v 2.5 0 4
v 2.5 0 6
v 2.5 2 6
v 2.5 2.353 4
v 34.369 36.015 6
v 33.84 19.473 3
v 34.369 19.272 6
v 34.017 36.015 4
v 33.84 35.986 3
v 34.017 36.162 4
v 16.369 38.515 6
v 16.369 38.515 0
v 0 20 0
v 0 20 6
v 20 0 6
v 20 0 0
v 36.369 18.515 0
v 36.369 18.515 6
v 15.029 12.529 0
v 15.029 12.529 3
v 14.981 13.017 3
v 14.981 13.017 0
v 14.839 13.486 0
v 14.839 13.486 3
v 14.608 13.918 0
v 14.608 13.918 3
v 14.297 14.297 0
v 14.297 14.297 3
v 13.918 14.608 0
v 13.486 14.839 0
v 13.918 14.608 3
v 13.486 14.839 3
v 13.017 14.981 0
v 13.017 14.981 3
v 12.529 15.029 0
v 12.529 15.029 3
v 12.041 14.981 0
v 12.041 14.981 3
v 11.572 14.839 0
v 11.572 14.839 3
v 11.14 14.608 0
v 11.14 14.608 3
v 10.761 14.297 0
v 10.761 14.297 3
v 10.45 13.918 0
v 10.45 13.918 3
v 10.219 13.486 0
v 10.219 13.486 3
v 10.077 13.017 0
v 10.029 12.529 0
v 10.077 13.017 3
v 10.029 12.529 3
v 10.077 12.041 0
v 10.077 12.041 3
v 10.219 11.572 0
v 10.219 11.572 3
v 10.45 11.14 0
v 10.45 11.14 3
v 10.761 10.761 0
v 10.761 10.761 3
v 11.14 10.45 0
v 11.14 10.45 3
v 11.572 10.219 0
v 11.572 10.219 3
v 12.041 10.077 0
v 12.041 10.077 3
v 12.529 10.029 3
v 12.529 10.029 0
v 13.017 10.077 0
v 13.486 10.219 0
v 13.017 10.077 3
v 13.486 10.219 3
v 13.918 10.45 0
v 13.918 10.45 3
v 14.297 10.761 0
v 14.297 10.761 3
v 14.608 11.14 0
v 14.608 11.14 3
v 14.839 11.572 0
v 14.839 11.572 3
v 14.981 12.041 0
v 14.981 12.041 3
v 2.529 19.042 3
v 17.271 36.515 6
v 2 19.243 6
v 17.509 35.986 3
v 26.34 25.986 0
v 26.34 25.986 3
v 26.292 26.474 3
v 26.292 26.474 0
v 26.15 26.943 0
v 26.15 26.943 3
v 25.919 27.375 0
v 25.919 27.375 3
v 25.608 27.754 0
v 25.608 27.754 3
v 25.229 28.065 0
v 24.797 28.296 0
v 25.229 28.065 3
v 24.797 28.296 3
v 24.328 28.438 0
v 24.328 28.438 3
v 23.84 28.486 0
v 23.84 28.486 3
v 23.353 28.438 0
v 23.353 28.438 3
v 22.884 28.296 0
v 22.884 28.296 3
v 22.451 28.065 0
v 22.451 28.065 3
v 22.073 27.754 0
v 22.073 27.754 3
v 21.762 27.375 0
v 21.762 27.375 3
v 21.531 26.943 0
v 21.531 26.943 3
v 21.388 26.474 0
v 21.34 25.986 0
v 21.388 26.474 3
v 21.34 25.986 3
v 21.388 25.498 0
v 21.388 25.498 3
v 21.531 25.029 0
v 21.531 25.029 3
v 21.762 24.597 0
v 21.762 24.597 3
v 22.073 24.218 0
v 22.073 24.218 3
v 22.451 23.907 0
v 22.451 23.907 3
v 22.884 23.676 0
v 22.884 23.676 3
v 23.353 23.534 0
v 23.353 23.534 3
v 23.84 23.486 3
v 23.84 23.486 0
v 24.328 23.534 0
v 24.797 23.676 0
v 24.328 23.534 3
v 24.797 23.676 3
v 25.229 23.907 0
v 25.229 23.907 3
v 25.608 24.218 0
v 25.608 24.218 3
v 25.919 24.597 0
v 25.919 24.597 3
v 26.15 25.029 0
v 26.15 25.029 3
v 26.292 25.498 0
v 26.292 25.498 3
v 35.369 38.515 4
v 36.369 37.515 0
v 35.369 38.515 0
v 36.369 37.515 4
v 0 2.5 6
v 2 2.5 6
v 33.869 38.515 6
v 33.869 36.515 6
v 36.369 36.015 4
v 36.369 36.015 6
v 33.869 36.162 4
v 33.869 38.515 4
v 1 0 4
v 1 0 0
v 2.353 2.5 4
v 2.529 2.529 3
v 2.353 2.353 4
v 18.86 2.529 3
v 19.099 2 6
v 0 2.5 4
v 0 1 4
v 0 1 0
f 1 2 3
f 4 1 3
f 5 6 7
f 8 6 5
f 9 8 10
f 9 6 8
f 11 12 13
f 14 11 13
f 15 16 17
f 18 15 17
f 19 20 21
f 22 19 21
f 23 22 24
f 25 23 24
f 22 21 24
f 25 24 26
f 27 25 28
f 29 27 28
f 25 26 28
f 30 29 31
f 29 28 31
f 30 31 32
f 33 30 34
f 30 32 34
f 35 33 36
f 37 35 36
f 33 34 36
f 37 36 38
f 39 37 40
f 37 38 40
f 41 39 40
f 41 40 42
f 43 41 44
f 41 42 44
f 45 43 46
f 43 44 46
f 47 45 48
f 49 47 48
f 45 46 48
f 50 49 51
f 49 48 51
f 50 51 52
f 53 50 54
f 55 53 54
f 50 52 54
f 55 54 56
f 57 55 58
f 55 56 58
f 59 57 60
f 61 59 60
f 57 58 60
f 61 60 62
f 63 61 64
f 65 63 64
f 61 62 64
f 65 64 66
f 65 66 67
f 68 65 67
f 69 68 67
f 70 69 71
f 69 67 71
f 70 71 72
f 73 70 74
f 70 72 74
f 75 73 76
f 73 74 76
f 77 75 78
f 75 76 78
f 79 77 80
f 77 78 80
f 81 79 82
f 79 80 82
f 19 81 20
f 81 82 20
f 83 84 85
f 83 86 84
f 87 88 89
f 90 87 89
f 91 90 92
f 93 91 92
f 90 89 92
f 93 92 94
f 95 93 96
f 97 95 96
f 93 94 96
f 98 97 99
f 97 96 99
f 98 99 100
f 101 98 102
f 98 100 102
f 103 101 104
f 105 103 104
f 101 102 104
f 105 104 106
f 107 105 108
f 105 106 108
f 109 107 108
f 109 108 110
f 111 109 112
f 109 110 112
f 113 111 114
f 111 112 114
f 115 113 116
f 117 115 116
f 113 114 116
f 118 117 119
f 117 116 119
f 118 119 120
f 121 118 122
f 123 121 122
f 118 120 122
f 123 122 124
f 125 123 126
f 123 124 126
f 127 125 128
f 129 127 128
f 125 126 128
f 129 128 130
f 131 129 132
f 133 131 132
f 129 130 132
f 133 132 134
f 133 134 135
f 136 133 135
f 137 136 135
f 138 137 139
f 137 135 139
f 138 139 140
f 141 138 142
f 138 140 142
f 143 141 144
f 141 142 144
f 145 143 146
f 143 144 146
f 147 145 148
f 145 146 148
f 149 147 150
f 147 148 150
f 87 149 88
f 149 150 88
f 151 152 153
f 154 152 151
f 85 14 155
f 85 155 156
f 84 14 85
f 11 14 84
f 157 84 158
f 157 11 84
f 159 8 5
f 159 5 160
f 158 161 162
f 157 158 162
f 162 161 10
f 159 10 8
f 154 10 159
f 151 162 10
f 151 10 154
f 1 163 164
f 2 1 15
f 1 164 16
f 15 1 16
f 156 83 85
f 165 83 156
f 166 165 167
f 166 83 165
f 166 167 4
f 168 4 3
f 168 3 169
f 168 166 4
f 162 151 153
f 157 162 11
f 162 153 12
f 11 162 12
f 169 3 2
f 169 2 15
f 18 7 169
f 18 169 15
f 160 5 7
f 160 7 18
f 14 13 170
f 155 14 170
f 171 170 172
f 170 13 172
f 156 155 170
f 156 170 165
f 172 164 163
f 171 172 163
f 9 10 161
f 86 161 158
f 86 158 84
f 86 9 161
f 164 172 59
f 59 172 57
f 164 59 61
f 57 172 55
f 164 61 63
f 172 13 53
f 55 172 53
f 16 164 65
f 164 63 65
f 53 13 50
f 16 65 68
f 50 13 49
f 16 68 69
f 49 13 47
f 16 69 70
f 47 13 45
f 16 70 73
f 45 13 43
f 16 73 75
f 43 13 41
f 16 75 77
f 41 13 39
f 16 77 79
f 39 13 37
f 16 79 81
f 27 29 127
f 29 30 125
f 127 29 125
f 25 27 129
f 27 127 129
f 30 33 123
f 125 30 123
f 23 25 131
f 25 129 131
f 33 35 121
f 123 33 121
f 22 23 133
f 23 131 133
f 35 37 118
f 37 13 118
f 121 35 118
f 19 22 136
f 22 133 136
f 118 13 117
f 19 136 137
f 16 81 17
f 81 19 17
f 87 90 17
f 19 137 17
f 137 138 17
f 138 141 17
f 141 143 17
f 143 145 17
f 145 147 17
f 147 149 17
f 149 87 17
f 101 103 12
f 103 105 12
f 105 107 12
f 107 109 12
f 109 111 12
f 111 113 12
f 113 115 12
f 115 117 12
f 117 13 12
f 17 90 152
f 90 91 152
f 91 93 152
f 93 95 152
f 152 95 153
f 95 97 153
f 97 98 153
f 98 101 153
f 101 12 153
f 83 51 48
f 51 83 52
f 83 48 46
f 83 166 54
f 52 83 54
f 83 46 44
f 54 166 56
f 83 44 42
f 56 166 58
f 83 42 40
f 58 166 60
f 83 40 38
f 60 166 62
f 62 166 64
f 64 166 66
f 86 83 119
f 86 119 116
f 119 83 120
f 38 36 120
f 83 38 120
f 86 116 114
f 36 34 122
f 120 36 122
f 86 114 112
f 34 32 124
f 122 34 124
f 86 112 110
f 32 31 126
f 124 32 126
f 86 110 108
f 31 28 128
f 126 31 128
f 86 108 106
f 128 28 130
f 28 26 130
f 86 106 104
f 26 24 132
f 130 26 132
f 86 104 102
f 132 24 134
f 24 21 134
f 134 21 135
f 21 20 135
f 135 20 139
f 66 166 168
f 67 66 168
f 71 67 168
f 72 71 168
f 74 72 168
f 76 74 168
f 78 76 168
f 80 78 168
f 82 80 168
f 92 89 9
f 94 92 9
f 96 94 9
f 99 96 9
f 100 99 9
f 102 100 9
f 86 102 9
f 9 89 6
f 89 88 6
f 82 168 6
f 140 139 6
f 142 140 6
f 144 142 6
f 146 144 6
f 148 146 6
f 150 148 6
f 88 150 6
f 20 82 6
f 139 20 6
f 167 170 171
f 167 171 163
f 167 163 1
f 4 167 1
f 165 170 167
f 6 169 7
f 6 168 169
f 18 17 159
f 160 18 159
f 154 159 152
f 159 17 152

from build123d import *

# Parameters (mm, degrees)
F1_DEPTH = 6
F3_DEPTH = 3
F3_TAPER = 10
F4_SIZE  = 1
F5_W     = 2.5
F5_H     = 2.5
F6_DEPTH = 2
F7_R     = 2.5
F8_DEPTH = 3


with BuildPart() as f1:
    # F0 (on Top) → F1 (new body)
    with BuildSketch(Plane.XY):
        Polygon((0, 20), (0, 0), (20, 0), (36.3692647093, 18.5151209051), (36.3692647093, 38.5151209051), (16.3692647093, 38.5151209051), align=None)
    extrude(amount=F1_DEPTH)

    # F2 (on face) → F3 (cut)
    with BuildSketch(Plane.XY.offset(6)):
        Polygon((2, 19.2426673516), (2, 2), (19.0986453142, 2), (34.3692647093, 19.2724535535), (34.3692647093, 36.5151209051), (17.2706193952, 36.5151209051), align=None)
    extrude(amount=-F3_DEPTH, taper=F3_TAPER, mode=Mode.SUBTRACT)

    # F4
    f4_edges = [f1.edges().sort_by_distance(p)[0] for p in [
        (0, 0, 3),
        (36.369265, 38.515121, 3),
    ]]
    chamfer(f4_edges, length=F4_SIZE)

    # F5 (on face) → F6 (cut)
    with BuildSketch(Plane.XY.offset(6)):
        with Locations((1.25, 1.25)):
            Rectangle(F5_W, F5_H)
        with Locations((35.1192647093, 37.2651209051)):
            Rectangle(F5_W, F5_H)
    extrude(amount=-F6_DEPTH, mode=Mode.SUBTRACT)

    # F7 (on face) → F8 (cut, through all)
    with BuildSketch(Plane.XY.offset(3)):
        with Locations((12.5289809421, 12.5289809421)):
            Circle(F7_R)
        with Locations((23.8402837672, 25.9861399629)):
            Circle(F7_R)
    extrude(amount=-F8_DEPTH, mode=Mode.SUBTRACT)


solid = f1.part
